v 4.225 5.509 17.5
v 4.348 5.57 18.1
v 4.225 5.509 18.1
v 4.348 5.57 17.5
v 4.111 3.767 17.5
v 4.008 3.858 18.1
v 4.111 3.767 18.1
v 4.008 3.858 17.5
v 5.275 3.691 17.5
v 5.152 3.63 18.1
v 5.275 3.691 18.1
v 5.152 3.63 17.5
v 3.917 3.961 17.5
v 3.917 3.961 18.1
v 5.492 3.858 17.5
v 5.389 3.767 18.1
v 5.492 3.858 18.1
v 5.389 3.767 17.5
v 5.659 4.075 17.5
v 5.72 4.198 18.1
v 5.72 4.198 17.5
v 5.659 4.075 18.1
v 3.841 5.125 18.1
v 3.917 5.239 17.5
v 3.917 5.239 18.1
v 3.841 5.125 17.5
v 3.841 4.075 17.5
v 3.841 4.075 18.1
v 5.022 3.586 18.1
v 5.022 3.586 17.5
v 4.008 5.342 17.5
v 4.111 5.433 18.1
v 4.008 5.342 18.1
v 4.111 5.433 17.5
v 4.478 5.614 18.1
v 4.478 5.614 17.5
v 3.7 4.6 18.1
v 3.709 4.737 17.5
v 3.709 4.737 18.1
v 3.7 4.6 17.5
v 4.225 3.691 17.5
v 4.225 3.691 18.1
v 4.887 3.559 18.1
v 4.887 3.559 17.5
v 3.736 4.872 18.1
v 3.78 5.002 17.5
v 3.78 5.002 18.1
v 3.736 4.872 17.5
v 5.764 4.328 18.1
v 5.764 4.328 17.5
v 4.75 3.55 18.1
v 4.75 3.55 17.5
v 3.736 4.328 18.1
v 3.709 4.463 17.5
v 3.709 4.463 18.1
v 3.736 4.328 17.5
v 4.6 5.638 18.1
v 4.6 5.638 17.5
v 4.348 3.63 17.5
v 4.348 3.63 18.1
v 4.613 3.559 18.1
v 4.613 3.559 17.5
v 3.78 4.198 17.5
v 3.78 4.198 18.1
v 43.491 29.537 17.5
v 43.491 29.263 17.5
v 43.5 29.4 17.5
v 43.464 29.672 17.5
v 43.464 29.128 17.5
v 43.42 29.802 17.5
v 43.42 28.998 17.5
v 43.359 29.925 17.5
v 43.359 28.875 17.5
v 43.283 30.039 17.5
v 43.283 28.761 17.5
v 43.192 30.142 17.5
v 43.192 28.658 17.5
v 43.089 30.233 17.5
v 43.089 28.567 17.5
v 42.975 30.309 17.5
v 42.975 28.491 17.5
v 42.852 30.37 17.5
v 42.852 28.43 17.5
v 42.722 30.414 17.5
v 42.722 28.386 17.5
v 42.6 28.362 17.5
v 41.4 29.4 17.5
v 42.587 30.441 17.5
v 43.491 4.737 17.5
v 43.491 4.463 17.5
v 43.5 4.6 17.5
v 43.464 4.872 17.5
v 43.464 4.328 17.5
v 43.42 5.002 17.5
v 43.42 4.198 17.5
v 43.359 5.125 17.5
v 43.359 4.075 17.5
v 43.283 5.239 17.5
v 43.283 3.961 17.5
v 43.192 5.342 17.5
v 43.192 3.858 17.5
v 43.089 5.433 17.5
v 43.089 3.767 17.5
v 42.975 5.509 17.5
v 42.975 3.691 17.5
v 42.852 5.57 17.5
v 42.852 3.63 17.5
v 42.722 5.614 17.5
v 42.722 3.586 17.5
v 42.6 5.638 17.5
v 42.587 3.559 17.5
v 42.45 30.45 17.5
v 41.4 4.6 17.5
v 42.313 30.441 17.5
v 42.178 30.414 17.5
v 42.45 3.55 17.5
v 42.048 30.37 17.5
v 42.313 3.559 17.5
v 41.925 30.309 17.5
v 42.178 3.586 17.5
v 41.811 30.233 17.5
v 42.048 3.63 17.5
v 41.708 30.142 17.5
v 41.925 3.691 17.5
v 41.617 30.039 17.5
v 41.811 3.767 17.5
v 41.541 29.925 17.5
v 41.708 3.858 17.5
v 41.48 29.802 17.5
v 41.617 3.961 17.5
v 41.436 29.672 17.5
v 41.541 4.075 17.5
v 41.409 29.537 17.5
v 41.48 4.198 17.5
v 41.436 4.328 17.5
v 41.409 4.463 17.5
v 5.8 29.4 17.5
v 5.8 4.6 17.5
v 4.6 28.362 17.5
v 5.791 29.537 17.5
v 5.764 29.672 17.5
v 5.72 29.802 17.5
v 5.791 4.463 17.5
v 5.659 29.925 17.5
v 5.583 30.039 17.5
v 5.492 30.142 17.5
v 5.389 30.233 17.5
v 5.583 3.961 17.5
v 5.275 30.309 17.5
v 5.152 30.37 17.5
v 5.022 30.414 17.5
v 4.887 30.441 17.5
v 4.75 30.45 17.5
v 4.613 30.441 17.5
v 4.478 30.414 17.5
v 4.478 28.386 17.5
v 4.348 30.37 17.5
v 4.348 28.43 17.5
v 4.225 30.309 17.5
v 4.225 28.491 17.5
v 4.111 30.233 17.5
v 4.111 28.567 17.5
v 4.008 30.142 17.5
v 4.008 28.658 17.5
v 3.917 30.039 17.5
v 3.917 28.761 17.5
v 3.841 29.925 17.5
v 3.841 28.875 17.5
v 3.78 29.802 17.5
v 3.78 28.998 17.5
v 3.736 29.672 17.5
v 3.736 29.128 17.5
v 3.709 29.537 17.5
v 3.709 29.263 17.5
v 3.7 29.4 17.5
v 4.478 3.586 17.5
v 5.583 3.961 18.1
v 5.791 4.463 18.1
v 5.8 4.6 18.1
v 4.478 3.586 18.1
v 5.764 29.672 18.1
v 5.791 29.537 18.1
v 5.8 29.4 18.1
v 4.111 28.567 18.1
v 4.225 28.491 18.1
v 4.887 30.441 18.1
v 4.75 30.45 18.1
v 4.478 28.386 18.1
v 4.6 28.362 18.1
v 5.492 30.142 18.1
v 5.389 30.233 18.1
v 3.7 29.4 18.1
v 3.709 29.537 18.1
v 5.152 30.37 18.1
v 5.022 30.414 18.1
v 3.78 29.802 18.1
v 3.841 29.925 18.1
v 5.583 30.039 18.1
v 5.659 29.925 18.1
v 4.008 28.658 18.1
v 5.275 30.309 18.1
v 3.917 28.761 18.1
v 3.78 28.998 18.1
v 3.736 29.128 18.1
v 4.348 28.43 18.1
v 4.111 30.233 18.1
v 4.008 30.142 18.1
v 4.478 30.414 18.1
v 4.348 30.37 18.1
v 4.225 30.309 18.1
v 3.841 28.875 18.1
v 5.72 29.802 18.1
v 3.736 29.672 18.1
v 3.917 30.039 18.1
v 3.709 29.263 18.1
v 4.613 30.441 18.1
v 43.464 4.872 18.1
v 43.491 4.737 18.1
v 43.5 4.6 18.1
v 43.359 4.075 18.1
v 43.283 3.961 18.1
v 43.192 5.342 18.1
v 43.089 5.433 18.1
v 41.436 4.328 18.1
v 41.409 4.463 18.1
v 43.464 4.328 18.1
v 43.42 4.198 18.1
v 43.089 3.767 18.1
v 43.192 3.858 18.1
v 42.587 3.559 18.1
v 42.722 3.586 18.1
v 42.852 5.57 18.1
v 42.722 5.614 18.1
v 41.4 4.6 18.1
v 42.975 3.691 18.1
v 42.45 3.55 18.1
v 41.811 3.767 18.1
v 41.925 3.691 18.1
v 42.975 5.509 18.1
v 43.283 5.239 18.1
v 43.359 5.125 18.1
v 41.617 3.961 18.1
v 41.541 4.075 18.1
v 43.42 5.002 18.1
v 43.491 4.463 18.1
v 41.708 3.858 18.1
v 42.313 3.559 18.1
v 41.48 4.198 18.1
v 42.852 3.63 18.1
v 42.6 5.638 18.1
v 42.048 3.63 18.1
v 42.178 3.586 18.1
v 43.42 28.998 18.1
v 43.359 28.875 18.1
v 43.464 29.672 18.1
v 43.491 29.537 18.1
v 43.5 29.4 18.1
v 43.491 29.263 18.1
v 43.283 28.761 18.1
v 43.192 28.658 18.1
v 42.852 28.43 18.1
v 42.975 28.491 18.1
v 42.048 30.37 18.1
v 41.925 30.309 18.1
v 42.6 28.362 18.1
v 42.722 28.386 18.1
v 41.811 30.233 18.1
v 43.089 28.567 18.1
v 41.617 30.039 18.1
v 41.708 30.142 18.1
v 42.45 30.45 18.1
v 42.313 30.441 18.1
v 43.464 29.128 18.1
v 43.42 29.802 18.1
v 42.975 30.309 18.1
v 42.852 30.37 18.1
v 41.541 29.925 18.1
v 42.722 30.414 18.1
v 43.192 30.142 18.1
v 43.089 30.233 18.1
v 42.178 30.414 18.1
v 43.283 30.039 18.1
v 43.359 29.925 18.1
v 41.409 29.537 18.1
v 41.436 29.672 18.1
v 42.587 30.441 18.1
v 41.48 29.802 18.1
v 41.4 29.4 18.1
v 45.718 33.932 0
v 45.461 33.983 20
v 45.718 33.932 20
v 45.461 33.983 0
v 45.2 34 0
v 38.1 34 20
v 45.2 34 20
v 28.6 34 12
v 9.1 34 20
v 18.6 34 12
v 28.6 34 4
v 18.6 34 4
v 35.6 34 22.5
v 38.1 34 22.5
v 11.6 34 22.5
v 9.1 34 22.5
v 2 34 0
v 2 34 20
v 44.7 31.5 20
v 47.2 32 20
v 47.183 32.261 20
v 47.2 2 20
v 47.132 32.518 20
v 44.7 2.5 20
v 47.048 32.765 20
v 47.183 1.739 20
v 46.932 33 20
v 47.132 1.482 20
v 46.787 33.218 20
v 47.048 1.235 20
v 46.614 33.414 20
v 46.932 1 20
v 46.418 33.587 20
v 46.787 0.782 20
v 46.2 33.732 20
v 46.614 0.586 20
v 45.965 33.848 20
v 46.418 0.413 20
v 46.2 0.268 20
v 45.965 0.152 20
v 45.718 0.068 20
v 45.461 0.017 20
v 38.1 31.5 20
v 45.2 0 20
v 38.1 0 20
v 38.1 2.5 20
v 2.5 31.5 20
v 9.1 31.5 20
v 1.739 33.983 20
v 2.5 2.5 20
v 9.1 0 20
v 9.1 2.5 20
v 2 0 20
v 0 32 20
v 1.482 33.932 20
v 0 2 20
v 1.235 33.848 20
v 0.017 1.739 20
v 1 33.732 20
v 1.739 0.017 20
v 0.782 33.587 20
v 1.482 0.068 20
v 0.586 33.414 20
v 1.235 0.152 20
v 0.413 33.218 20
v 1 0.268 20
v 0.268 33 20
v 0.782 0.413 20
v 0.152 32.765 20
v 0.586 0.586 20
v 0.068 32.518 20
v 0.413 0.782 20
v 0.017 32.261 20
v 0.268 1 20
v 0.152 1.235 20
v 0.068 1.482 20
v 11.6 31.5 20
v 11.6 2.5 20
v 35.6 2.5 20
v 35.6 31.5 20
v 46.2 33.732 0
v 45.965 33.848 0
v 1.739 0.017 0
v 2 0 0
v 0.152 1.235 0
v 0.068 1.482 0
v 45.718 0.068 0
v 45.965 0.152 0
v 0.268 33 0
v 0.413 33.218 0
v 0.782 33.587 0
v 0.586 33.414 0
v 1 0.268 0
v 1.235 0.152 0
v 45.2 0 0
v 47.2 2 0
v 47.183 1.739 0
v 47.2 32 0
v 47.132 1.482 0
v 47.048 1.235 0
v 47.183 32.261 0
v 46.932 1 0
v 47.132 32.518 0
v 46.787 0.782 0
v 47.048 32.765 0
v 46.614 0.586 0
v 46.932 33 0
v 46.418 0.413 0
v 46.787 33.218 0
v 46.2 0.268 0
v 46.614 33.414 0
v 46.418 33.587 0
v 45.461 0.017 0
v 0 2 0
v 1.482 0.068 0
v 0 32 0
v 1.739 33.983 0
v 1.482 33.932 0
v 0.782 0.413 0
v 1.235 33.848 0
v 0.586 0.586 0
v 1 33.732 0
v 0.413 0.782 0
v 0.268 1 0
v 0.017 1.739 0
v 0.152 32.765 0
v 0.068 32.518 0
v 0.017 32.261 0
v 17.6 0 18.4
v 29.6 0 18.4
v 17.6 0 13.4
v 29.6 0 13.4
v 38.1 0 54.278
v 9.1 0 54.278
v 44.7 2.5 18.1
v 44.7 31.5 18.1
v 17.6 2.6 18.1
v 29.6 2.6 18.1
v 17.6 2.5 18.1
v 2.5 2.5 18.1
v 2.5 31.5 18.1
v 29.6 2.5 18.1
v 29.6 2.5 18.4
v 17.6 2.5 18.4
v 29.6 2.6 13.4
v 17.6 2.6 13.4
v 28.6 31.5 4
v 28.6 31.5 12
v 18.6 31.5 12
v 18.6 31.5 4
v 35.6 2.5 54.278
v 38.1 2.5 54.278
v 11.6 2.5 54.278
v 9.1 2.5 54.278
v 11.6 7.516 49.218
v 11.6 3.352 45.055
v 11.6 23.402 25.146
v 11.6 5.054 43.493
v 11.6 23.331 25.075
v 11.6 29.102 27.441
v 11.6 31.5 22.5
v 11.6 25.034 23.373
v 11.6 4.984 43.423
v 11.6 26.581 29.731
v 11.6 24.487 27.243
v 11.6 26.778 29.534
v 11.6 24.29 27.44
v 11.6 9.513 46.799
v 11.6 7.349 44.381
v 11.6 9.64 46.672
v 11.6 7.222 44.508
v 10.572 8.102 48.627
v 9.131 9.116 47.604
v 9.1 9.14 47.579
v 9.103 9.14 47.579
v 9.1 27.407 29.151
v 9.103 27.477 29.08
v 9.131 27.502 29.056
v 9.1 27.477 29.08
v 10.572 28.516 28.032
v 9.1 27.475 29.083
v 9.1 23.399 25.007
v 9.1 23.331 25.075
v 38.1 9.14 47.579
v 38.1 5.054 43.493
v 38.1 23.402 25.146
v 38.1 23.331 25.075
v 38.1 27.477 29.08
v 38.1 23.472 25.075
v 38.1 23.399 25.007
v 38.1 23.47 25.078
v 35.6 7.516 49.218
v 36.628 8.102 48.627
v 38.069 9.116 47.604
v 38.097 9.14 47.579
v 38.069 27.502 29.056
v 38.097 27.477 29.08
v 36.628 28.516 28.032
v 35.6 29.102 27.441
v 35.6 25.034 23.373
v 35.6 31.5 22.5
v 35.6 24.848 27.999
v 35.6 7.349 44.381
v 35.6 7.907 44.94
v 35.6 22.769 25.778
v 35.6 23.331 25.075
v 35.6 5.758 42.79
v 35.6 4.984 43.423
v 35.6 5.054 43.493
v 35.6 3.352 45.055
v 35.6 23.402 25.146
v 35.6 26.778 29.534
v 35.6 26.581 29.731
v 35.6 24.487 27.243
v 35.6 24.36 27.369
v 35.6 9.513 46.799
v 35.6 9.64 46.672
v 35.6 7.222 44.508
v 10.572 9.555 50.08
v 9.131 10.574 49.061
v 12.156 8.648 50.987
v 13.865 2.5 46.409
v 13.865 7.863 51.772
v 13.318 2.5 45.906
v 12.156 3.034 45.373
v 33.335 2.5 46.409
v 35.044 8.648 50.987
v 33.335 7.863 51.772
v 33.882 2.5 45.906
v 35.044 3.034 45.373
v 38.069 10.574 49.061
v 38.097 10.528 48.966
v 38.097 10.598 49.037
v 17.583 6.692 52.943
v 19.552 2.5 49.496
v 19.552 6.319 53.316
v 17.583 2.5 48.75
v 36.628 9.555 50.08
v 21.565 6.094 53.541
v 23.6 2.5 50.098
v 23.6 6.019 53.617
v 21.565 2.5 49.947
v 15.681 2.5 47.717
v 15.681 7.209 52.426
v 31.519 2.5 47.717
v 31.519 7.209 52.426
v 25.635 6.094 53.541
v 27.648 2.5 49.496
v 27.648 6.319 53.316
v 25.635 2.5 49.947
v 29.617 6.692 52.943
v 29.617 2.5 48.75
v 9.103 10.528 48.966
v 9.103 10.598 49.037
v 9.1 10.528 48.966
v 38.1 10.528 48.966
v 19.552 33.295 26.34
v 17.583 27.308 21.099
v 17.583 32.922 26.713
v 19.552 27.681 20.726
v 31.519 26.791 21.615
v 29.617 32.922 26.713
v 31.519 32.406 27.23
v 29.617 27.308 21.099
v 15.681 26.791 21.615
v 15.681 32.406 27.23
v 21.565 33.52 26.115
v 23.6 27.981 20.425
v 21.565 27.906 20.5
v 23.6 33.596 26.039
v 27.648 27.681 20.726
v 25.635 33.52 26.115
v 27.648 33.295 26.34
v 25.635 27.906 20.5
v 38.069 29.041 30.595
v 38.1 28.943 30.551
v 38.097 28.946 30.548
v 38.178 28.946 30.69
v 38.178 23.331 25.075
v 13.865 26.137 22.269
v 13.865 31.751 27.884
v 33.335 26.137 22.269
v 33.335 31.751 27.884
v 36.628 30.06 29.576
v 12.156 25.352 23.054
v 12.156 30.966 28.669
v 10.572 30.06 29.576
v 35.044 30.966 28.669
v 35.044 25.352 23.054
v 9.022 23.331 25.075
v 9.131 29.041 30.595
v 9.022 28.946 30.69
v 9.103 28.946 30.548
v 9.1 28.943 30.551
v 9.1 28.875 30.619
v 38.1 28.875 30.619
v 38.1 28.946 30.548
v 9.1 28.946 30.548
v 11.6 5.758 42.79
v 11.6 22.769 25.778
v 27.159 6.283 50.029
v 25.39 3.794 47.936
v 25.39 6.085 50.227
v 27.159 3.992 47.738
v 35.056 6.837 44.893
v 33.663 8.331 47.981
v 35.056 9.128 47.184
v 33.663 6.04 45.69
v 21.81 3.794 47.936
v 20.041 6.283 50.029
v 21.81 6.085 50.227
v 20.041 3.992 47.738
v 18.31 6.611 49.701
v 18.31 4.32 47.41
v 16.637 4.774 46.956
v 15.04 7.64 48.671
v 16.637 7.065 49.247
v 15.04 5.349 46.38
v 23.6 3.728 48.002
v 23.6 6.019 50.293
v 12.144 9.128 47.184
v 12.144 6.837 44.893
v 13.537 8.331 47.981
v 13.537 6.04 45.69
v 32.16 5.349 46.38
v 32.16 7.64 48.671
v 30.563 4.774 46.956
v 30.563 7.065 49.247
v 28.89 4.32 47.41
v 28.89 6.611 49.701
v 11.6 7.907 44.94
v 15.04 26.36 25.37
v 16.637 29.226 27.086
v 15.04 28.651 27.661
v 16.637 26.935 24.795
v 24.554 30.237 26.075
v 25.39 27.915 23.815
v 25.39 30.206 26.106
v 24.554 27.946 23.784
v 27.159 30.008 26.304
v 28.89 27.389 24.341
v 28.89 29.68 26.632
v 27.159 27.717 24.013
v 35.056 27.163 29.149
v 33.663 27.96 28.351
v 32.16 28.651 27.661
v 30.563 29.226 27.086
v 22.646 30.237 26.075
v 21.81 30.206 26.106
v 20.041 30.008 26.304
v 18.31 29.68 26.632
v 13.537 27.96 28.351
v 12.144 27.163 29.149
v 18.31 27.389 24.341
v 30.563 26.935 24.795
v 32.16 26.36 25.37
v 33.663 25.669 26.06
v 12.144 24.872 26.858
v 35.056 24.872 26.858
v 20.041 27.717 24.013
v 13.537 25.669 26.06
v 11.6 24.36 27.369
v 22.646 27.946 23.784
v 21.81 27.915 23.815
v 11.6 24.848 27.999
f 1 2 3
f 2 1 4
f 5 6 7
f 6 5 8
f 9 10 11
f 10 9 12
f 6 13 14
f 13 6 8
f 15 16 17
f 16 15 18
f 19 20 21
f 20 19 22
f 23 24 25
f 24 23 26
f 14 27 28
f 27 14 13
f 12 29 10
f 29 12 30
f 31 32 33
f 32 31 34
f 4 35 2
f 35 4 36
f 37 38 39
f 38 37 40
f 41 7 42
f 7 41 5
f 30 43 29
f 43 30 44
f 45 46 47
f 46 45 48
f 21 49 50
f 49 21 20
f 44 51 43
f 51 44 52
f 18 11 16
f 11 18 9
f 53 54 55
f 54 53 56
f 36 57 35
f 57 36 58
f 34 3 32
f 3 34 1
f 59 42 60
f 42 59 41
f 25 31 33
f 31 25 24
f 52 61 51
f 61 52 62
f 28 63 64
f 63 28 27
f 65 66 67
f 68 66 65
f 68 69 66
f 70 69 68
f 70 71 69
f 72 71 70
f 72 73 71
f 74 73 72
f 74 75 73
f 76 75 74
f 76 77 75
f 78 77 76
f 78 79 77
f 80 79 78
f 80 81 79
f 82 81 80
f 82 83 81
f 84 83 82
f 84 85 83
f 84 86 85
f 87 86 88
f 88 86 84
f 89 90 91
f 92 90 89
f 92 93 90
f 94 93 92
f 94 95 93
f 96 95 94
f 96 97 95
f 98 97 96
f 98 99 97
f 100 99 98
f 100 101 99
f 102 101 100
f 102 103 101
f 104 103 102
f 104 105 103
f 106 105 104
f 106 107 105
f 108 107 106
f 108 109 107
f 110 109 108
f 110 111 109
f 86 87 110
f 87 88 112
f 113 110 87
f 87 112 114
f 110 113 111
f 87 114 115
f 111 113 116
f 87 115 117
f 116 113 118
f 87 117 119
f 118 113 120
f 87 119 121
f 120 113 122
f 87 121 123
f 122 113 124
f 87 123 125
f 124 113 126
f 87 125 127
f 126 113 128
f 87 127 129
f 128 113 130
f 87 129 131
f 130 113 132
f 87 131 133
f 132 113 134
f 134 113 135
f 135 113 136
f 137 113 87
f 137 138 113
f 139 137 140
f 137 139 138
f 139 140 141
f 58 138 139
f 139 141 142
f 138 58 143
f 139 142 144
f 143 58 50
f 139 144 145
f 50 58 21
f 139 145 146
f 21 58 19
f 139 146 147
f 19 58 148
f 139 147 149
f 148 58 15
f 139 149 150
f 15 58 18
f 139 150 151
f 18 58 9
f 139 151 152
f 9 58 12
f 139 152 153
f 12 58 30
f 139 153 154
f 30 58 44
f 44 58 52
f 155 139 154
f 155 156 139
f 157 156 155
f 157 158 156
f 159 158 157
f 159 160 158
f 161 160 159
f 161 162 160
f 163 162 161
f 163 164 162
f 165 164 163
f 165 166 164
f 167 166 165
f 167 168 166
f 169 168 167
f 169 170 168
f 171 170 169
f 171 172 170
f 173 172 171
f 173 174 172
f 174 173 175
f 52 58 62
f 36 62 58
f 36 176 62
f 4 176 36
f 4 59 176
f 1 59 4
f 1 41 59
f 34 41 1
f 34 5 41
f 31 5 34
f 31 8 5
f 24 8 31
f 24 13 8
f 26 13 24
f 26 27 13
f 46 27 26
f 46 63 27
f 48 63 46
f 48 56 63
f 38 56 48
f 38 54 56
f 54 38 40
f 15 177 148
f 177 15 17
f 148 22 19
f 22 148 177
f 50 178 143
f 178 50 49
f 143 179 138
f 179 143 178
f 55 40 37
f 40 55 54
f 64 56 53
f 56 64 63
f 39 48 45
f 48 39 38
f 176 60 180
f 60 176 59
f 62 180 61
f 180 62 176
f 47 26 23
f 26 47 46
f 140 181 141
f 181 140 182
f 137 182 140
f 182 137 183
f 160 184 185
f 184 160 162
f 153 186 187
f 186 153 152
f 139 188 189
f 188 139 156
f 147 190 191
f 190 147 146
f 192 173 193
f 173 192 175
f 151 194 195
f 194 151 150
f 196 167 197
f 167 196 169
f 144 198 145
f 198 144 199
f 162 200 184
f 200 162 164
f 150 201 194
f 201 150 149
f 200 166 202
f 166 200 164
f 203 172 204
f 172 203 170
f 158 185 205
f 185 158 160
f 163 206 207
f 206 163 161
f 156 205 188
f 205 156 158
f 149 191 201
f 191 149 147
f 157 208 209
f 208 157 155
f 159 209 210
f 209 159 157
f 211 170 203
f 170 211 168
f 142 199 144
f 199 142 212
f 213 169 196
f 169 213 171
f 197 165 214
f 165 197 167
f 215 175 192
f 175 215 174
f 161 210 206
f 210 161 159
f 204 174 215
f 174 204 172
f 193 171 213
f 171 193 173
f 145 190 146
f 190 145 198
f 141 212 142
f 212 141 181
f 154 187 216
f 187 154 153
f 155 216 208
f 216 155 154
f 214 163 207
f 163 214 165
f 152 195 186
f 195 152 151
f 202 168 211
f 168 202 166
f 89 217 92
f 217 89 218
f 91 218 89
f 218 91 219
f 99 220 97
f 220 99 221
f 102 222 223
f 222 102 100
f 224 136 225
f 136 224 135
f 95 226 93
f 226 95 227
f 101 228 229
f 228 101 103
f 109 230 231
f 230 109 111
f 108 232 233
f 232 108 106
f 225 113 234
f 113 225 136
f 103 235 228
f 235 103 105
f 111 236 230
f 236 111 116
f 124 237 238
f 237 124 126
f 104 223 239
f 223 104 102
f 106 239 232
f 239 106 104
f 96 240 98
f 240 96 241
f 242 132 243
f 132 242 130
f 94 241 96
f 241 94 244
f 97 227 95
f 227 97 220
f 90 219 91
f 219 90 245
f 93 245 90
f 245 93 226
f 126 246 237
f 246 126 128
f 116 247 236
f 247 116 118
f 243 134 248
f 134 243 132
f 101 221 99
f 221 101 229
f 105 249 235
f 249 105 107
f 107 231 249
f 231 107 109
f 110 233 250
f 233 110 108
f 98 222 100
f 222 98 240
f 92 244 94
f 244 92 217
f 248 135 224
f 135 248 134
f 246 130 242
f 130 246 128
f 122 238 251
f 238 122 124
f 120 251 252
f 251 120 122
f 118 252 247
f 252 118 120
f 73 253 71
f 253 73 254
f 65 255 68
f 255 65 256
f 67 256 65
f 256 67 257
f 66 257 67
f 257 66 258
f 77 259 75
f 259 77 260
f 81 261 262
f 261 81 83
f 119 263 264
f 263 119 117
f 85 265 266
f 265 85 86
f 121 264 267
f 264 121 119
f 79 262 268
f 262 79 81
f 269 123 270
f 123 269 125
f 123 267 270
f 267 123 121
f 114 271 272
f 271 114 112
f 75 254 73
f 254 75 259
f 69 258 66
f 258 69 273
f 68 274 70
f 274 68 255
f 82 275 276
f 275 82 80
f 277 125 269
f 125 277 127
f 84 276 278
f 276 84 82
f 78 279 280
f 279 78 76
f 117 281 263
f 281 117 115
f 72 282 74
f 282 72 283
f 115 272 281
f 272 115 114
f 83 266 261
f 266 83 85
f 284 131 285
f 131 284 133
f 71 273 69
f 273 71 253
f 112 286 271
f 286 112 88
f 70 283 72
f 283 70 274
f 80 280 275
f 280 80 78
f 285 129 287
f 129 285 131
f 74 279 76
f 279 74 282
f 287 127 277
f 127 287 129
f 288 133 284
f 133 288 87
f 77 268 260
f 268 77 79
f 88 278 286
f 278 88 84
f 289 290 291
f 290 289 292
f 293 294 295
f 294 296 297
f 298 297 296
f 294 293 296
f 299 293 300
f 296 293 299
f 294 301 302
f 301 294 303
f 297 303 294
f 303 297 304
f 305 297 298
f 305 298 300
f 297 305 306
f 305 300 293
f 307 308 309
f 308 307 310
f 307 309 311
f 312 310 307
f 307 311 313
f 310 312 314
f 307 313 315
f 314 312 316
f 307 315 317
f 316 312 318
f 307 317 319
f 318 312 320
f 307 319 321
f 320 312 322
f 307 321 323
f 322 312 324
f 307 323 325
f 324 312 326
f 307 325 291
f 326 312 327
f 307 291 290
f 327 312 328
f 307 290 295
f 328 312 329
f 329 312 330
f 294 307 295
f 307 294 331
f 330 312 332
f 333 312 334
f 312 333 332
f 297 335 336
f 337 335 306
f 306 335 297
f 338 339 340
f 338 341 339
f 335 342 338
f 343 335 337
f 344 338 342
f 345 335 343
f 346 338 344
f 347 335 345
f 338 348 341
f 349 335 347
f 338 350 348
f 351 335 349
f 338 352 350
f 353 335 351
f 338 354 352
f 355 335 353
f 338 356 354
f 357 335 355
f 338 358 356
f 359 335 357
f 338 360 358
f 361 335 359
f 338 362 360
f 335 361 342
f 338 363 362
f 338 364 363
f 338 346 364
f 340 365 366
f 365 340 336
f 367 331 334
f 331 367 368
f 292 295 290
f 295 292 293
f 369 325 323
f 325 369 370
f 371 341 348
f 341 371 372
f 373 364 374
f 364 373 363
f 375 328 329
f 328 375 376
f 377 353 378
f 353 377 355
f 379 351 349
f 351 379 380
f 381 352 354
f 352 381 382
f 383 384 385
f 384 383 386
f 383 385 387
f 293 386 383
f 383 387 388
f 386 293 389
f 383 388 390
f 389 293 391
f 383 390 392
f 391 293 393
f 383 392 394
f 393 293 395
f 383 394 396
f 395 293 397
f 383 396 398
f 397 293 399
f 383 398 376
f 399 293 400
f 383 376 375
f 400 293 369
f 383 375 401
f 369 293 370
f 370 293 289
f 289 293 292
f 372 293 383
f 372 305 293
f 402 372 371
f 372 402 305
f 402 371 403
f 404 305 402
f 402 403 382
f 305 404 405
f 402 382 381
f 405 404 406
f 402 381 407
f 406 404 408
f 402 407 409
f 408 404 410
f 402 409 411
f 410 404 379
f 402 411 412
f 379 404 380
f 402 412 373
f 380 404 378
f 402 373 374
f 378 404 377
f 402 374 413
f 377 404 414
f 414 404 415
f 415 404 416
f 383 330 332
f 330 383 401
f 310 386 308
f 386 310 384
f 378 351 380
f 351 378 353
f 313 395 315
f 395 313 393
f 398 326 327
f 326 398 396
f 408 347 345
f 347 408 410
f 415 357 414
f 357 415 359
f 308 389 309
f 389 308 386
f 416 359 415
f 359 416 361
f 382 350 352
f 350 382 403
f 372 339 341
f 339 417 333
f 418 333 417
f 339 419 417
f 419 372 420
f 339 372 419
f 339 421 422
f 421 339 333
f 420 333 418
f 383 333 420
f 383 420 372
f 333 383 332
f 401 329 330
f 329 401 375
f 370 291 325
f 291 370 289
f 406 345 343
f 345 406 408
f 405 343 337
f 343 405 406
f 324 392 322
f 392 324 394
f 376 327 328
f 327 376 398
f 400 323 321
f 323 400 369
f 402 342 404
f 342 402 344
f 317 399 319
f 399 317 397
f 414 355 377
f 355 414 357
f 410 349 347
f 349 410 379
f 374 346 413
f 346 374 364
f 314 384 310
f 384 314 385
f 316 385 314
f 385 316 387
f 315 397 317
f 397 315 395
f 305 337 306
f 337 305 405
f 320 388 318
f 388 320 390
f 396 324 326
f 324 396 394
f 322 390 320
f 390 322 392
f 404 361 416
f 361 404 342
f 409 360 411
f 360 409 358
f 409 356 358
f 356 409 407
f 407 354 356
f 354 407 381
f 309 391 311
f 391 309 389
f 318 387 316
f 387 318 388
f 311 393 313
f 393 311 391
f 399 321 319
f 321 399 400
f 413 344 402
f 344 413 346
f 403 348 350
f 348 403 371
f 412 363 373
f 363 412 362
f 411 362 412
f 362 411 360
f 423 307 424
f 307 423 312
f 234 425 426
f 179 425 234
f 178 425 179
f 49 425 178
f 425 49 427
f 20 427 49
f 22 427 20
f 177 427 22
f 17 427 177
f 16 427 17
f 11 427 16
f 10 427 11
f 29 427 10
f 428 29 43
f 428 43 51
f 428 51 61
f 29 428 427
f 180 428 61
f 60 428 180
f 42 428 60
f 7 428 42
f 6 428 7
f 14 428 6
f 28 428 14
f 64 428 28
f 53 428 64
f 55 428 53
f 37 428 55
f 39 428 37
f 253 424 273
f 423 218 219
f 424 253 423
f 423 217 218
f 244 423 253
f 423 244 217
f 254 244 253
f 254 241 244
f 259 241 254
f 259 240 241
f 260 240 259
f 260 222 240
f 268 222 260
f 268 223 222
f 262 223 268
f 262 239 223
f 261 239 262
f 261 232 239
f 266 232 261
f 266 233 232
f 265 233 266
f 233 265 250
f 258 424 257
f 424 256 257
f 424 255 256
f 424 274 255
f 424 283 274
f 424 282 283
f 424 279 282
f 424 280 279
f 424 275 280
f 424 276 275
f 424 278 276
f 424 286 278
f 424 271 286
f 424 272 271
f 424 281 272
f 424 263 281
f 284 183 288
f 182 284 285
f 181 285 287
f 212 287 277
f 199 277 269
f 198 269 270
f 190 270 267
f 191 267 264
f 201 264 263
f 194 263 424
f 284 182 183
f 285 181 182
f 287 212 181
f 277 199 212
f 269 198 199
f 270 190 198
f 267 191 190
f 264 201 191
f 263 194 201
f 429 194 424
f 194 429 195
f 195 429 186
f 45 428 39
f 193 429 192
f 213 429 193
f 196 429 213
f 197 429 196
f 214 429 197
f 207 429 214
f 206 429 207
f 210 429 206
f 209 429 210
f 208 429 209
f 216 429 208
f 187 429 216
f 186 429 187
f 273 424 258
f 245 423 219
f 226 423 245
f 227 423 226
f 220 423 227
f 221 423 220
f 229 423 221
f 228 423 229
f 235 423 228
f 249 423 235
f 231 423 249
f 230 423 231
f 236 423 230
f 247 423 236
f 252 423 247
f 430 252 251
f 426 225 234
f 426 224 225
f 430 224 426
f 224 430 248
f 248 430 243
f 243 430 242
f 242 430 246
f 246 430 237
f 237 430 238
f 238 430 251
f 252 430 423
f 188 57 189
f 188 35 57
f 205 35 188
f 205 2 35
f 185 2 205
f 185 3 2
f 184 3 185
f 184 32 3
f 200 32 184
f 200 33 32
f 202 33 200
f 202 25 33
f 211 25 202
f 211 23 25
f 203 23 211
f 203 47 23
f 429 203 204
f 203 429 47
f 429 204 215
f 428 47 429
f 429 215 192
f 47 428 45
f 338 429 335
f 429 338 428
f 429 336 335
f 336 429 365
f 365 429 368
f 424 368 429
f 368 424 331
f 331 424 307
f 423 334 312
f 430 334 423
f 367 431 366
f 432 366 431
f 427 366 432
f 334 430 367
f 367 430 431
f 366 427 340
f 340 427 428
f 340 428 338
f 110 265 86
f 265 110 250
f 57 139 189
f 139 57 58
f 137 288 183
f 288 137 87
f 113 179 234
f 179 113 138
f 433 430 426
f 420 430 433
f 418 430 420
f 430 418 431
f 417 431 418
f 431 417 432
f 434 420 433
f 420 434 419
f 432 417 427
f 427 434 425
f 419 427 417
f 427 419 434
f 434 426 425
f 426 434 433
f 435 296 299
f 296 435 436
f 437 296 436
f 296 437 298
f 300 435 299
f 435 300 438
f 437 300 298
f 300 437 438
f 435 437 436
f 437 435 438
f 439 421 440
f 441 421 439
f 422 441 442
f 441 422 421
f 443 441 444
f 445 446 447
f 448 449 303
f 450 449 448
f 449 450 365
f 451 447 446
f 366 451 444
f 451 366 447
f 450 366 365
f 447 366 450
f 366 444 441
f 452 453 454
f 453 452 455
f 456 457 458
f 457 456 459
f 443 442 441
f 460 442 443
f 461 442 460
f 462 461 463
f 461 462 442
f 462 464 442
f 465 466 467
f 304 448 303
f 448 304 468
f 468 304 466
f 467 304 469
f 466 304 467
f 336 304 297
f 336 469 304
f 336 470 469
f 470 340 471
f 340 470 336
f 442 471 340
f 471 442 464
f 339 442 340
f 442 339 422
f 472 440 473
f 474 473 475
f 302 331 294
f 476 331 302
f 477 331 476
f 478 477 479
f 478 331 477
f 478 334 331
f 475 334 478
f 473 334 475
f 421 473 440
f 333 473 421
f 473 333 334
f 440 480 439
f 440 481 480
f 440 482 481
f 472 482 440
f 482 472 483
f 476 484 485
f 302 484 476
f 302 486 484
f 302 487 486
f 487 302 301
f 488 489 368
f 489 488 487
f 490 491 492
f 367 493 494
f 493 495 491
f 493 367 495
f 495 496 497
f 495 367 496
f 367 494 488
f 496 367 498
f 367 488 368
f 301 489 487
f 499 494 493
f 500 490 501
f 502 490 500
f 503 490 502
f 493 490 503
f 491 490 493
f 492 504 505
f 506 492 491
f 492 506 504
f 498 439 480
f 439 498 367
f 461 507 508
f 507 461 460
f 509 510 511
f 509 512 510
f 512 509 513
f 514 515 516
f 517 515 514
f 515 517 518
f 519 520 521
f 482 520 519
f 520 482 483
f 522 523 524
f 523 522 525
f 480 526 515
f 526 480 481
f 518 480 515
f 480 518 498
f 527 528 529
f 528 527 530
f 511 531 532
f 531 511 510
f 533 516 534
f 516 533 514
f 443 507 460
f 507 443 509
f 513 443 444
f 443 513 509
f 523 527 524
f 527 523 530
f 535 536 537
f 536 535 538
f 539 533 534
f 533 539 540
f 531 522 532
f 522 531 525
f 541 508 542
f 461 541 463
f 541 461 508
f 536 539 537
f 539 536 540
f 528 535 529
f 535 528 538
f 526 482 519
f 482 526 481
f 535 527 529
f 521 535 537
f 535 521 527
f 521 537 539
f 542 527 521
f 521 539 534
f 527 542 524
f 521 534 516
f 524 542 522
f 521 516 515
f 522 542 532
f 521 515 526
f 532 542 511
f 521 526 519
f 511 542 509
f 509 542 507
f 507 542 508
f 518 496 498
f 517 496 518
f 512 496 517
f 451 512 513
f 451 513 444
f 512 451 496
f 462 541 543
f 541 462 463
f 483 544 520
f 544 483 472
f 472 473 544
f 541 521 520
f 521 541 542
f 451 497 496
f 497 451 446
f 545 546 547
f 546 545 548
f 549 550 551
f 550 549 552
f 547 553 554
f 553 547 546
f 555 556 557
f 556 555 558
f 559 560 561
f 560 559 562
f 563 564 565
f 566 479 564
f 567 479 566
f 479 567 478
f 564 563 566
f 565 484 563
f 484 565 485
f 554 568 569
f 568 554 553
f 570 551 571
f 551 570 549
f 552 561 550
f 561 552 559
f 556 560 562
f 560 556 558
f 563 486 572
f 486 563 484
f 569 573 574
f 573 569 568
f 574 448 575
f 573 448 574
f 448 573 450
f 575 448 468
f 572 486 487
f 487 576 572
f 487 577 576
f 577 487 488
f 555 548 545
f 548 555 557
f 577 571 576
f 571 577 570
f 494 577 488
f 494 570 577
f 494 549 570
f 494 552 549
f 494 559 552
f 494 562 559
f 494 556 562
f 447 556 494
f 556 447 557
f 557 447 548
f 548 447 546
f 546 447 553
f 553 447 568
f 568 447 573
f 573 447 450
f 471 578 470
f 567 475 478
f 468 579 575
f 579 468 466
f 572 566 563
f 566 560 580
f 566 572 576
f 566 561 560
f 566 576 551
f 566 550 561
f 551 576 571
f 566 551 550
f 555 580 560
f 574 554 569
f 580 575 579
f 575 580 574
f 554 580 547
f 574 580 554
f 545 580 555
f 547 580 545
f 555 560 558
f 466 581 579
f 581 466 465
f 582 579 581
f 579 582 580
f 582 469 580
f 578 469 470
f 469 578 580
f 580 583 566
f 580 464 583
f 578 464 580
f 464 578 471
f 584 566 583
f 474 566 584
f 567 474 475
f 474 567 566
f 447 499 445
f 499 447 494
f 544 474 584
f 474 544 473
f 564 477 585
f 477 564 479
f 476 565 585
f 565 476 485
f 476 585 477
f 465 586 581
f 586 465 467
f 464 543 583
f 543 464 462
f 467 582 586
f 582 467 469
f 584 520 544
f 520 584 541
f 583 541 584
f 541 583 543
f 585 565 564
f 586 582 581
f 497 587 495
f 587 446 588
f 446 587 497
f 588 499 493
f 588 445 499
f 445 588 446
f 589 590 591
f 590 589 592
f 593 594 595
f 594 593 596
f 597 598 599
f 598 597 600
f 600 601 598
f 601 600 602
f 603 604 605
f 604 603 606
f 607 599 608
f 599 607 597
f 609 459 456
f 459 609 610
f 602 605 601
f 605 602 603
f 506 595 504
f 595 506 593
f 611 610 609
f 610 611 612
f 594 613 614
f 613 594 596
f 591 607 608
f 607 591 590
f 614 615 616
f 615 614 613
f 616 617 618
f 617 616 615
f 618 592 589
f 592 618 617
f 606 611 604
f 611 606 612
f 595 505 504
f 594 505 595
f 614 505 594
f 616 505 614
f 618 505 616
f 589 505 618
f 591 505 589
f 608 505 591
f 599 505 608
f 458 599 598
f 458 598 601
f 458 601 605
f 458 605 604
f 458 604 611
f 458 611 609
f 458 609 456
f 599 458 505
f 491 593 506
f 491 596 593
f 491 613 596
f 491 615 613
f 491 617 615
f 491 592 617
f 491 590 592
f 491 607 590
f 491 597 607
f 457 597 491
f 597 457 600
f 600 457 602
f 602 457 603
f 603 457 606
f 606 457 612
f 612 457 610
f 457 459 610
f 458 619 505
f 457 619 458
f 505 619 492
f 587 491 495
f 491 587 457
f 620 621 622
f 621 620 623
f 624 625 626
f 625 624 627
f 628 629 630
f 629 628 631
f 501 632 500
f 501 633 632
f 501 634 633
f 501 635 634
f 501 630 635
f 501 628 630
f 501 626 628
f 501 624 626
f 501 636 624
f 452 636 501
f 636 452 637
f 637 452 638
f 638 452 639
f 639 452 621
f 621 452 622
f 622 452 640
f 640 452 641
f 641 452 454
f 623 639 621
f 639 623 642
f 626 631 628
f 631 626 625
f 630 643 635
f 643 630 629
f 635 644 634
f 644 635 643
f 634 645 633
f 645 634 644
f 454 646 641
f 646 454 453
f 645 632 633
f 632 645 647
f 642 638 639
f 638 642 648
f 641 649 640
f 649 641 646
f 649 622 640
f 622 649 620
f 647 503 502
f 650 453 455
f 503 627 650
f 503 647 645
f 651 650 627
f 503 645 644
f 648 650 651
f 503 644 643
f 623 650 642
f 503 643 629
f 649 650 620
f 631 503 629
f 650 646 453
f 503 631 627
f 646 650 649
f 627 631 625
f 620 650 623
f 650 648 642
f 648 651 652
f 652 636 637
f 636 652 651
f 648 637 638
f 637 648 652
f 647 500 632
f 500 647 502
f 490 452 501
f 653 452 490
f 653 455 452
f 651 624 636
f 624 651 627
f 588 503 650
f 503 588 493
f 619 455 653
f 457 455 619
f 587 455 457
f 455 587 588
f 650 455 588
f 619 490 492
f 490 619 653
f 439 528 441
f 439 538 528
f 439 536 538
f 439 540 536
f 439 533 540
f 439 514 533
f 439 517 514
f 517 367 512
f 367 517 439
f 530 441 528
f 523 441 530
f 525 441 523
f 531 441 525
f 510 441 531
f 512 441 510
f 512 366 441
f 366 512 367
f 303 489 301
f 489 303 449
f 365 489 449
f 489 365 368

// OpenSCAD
// ============================================================
// Exacto Reflex Sight Housing — v2
//
// Layout:
//   screen_body()        box holding OLED + electronics, display up
//   rear_post()          tall wall at Y=0 supporting high glass edge
//   front_post()         short ledge at Y=body_d for low glass edge
//   side_rails()         left+right walls tying posts together
//   glass_frame_mount()  combiner glass frame at `angle` degrees
//
// Display: Waveshare 1.27-inch SSD1351 RGB OLED
//   PCB     42.20 × 29.00 mm  (hardware/display/dimensions.png)
//   Active  38.00 × 24.80 mm
//   Holes   ø2.10, inset 2.25 mm (X) / 2.10 mm (Y) from PCB edge
//
// Lens:   24.00 × 34.00 mm, 2.74 mm thick, top arc R16.97
//         (hardware/lens/lense.avif)
// ============================================================

// ┌─────────────────────────────────────────────────────────┐
// │  CHANGE THIS VALUE, RE-EXPORT STL, REPRINT              │
// │  angle = combiner tilt from horizontal                  │
// │  45° = classic half-mirror reflex position              │
// └─────────────────────────────────────────────────────────┘
angle = 45;   // degrees  (recommended 35–65)

// ── Display ──────────────────────────────────────────────────
disp_pcb_w      = 42.20;
disp_pcb_h      = 29.00;
disp_pcb_t      =  1.60;
disp_active_w   = 38.00;
disp_active_h   = 24.80;
disp_hole_d     =  2.10;
disp_hole_off_x =  2.25;
disp_hole_off_y =  2.10;

// ── Lens ─────────────────────────────────────────────────────
lens_w     = 24.00;
lens_h     = 34.00;
lens_t     =  2.74;
lens_top_r = 16.97;   // radius of top arc

// ── Structure ────────────────────────────────────────────────
wall       =  2.50;
clearance  =  0.30;
body_height = 20.00;  // must fit Arduino Nano + wiring

$fn = 48;

// ── Derived ──────────────────────────────────────────────────
body_w = disp_pcb_w + 2*wall;   // 47.20
body_d = disp_pcb_h + 2*wall;   // 34.00
arm_w  = lens_w + 2*wall;        // 29.00  — frame/post width in X
frame_y = lens_t + 2*wall;       // 7.74   — frame depth (Y, along glass normal)
frame_z = lens_h + 2*wall;       // 39.00  — frame height
x_off   = (body_w - arm_w) / 2; // 9.10   — X offset to centre glass on body

// Lens profile geometry (see hardware/lens/lense.avif):
//   BOTH ends are rounded with the same radius lens_top_r = 16.97 mm.
//   half_chord = sqrt(lens_top_r² - (lens_w/2)²) = 12.00 mm
//   Top arc centre:    z = lens_h - lens_top_r = 17.03  (in lens local Z)
//   Bottom arc centre: z = lens_top_r          = 16.97  (symmetric)
//   top arc tangent:   z = (lens_h-lens_top_r) + half_chord = 29.03 mm  (= lens_rect_h)
//   bottom arc tangent:z = lens_top_r - half_chord          =  4.97 mm  (= bot_rect_z)
//   Straight section height: lens_rect_h - bot_rect_z ≈ 24.06 mm
lens_arc_cz  = lens_h - lens_top_r;                                    // 17.03
lens_rect_h  = lens_arc_cz + sqrt(lens_top_r*lens_top_r - (lens_w/2)*(lens_w/2)); // 29.03
bot_rect_z   = lens_top_r - sqrt(lens_top_r*lens_top_r - (lens_w/2)*(lens_w/2)); //  4.97

// Glass center in world space.
// The glass is tilted at `angle` from horizontal in the YZ plane.
// "Top" edge (local +Z of frame) maps to world REAR-HIGH direction.
// "Bottom" edge maps to FRONT-LOW direction.
// We set clearance_body = 5 mm above body top at the bottom edge.
clearance_body = 5;
glass_cz = body_height + clearance_body + lens_h/2 * sin(angle);  // 42.02 at 45°
glass_cy = body_d / 2;                                              // 17.00

// World positions of glass edges (for calculating post heights)
// Using rotate([90-angle,0,0]) on the frame:
//   local +Z  → world (0, -cos(angle),  sin(angle)) [rear-up]
//   local +Y  → world (0,  sin(angle),  cos(angle)) [forward-up]
//
// Bottom edge (local Z = -frame_z/2 from centre):
glass_bottom_z = glass_cz - lens_h/2 * sin(angle);  // = body_height + clearance_body
glass_bottom_y = glass_cy + lens_h/2 * cos(angle);
// Top edge (local Z = +frame_z/2 from centre):
glass_top_z    = glass_cz + lens_h/2 * sin(angle);
glass_top_y    = glass_cy - lens_h/2 * cos(angle);

// Post heights above body_height
rear_post_h  = glass_top_z  + frame_y/2*cos(angle) + wall - body_height;
front_post_h = max(wall, glass_bottom_z - frame_y/2*cos(angle) - body_height);

// ============================================================

module rounded_box(w, d, h, r=2) {
    hull()
        for (x=[r,w-r], y=[r,d-r])
            translate([x,y,0]) cylinder(r=r, h=h);
}

// ── Screen body ──────────────────────────────────────────────
// Display window faces UP (+Z).  Y=0 = rear, Y=body_d = front.
module screen_body() {
    difference() {
        rounded_box(body_w, body_d, body_height);

        // PCB pocket
        translate([wall, wall, body_height - disp_pcb_t - clearance])
            cube([disp_pcb_w, disp_pcb_h, disp_pcb_t + clearance + 0.1]);

        // Active-area window in top face
        translate([
            wall + (disp_pcb_w - disp_active_w)/2,
            wall + (disp_pcb_h - disp_active_h)/2,
            body_height - wall
        ])
            cube([disp_active_w, disp_active_h, wall + 0.2]);

        // PCB mount holes ø2.10
        for (sx=[-1,1], sy=[-1,1])
            translate([
                wall + disp_pcb_w/2 + sx*(disp_pcb_w/2 - disp_hole_off_x),
                wall + disp_pcb_h/2 + sy*(disp_pcb_h/2 - disp_hole_off_y),
                body_height - wall
            ])
                cylinder(d=disp_hole_d, h=wall+1);

        // Ribbon cable slot in rear wall (Y=0)
        translate([body_w/2-6, -0.1, body_height - disp_pcb_t - 5])
            cube([12, wall+0.2, 5]);

        // USB/power port in front wall
        translate([body_w/2-5, body_d-wall, 4])
            cube([10, wall+0.2, 8]);
    }
}

// ── Rear post ────────────────────────────────────────────────
// Tall wall across the full arm width at the rear (Y=0).
// Supports the high edge of the glass.
module rear_post() {
    translate([x_off, 0, body_height])
        cube([arm_w, wall, rear_post_h]);
}

// ── Front post ───────────────────────────────────────────────
// Short ledge at the front (Y=body_d) supporting the low glass edge.
module front_post() {
    translate([x_off, body_d - wall, body_height])
        cube([arm_w, wall, front_post_h]);
}

// ── Side rails ───────────────────────────────────────────────
// Left and right walls connecting rear and front posts.
// Their top edge follows the glass tilt so the frame sits flush.
module side_rails() {
    for (x = [x_off, x_off + arm_w - wall])
        translate([x, 0, body_height])
            hull() {
                cube([wall, wall,         rear_post_h]);
                translate([0, body_d-wall, 0])
                    cube([wall, wall, front_post_h]);
            }
}

// ── Lens frame ───────────────────────────────────────────────
// A pocket that grips the combiner glass (24 × 34 mm, top arc R16.97).
// Glass slides in from the –Y face.
//
// Frame outer profile = lens profile offset by wall (same arc centres, R_outer = lens_top_r + wall).
// Both ends are rounded — mirrors the lens profile.
module lens_frame() {
    R_outer       = lens_top_r + wall;
    outer_arc_cz  = wall + lens_arc_cz;           // top arc centre    2.5+17.03 = 19.53
    outer_bot_cz  = wall + lens_top_r;            // bottom arc centre 2.5+16.97 = 19.47
    half_chord_o  = sqrt(R_outer*R_outer - (arm_w/2)*(arm_w/2));  // 12.99
    outer_rect_h  = outer_arc_cz  + half_chord_o;  // 32.52
    outer_bot_rect_z = outer_bot_cz - half_chord_o; // 6.48

    difference() {
        // Outer shell: straight section + arc caps on both ends
        union() {
            // Straight section between the two outer arc tangent lines
            translate([0, 0, outer_bot_rect_z])
                cube([arm_w, frame_y, outer_rect_h - outer_bot_rect_z]);

            // Top arc cap clipped above outer_rect_h (sagitta ≈ 6.5 mm)
            intersection() {
                translate([arm_w/2, frame_y/2, outer_arc_cz])
                    rotate([90, 0, 0])
                        cylinder(r=R_outer, h=frame_y + 0.2, center=true, $fn=60);
                translate([-1, -0.1, outer_rect_h])
                    cube([arm_w + 2, frame_y + 0.2, R_outer]);
            }

            // Bottom arc cap clipped below outer_bot_rect_z (sagitta ≈ 6.5 mm)
            intersection() {
                translate([arm_w/2, frame_y/2, outer_bot_cz])
                    rotate([90, 0, 0])
                        cylinder(r=R_outer, h=frame_y + 0.2, center=true, $fn=60);
                translate([-1, -0.1, -0.1])
                    cube([arm_w + 2, frame_y + 0.2, outer_bot_rect_z + 0.2]);
            }
        }

        // Glass pocket: straight section only (between the two arc tangent lines)
        translate([wall, -0.1, wall + bot_rect_z])
            cube([lens_w, lens_t + clearance + 0.1, lens_rect_h - bot_rect_z]);

        // Glass pocket: top arc cap clipped above lens_rect_h (sagitta ≈ 4.97 mm)
        intersection() {
            translate([arm_w/2, frame_y/2, wall + lens_arc_cz])
                rotate([90, 0, 0])
                    cylinder(r=lens_top_r + clearance/2,
                             h=lens_t + clearance + 0.2, center=true, $fn=60);
            translate([-1, -0.1, wall + lens_rect_h])
                cube([arm_w + 2, frame_y + 0.2, lens_top_r + 1]);
        }

        // Glass pocket: bottom arc cap clipped below bot_rect_z (sagitta ≈ 4.97 mm)
        intersection() {
            translate([arm_w/2, frame_y/2, wall + lens_top_r])
                rotate([90, 0, 0])
                    cylinder(r=lens_top_r + clearance/2,
                             h=lens_t + clearance + 0.2, center=true, $fn=60);
            translate([-1, -0.1, wall - 0.1])
                cube([arm_w + 2, frame_y + 0.2, bot_rect_z + 0.2]);
        }
    }
}

// ── Glass frame at angle ─────────────────────────────────────
// Positions lens_frame() at glass_cz with the correct tilt.
//
// rotate([90-angle, 0, 0]) maps:
//   local +Y (frame depth/normal) → world (0,  sin(a), cos(a))  [forward-up]
//   local +Z (frame height)       → world (0, -cos(a), sin(a))  [rear-up]
// This gives: bottom of glass at front-low, top at rear-high.
module glass_frame_mount() {
    translate([body_w/2, glass_cy, glass_cz])
        rotate([90 - angle, 0, 0])
            translate([-arm_w/2, -frame_y/2, -frame_z/2])
                lens_frame();
}

// ── Full housing ─────────────────────────────────────────────
module sight_housing() {
    screen_body();
    rear_post();
    front_post();
    side_rails();
    glass_frame_mount();
}

sight_housing();
